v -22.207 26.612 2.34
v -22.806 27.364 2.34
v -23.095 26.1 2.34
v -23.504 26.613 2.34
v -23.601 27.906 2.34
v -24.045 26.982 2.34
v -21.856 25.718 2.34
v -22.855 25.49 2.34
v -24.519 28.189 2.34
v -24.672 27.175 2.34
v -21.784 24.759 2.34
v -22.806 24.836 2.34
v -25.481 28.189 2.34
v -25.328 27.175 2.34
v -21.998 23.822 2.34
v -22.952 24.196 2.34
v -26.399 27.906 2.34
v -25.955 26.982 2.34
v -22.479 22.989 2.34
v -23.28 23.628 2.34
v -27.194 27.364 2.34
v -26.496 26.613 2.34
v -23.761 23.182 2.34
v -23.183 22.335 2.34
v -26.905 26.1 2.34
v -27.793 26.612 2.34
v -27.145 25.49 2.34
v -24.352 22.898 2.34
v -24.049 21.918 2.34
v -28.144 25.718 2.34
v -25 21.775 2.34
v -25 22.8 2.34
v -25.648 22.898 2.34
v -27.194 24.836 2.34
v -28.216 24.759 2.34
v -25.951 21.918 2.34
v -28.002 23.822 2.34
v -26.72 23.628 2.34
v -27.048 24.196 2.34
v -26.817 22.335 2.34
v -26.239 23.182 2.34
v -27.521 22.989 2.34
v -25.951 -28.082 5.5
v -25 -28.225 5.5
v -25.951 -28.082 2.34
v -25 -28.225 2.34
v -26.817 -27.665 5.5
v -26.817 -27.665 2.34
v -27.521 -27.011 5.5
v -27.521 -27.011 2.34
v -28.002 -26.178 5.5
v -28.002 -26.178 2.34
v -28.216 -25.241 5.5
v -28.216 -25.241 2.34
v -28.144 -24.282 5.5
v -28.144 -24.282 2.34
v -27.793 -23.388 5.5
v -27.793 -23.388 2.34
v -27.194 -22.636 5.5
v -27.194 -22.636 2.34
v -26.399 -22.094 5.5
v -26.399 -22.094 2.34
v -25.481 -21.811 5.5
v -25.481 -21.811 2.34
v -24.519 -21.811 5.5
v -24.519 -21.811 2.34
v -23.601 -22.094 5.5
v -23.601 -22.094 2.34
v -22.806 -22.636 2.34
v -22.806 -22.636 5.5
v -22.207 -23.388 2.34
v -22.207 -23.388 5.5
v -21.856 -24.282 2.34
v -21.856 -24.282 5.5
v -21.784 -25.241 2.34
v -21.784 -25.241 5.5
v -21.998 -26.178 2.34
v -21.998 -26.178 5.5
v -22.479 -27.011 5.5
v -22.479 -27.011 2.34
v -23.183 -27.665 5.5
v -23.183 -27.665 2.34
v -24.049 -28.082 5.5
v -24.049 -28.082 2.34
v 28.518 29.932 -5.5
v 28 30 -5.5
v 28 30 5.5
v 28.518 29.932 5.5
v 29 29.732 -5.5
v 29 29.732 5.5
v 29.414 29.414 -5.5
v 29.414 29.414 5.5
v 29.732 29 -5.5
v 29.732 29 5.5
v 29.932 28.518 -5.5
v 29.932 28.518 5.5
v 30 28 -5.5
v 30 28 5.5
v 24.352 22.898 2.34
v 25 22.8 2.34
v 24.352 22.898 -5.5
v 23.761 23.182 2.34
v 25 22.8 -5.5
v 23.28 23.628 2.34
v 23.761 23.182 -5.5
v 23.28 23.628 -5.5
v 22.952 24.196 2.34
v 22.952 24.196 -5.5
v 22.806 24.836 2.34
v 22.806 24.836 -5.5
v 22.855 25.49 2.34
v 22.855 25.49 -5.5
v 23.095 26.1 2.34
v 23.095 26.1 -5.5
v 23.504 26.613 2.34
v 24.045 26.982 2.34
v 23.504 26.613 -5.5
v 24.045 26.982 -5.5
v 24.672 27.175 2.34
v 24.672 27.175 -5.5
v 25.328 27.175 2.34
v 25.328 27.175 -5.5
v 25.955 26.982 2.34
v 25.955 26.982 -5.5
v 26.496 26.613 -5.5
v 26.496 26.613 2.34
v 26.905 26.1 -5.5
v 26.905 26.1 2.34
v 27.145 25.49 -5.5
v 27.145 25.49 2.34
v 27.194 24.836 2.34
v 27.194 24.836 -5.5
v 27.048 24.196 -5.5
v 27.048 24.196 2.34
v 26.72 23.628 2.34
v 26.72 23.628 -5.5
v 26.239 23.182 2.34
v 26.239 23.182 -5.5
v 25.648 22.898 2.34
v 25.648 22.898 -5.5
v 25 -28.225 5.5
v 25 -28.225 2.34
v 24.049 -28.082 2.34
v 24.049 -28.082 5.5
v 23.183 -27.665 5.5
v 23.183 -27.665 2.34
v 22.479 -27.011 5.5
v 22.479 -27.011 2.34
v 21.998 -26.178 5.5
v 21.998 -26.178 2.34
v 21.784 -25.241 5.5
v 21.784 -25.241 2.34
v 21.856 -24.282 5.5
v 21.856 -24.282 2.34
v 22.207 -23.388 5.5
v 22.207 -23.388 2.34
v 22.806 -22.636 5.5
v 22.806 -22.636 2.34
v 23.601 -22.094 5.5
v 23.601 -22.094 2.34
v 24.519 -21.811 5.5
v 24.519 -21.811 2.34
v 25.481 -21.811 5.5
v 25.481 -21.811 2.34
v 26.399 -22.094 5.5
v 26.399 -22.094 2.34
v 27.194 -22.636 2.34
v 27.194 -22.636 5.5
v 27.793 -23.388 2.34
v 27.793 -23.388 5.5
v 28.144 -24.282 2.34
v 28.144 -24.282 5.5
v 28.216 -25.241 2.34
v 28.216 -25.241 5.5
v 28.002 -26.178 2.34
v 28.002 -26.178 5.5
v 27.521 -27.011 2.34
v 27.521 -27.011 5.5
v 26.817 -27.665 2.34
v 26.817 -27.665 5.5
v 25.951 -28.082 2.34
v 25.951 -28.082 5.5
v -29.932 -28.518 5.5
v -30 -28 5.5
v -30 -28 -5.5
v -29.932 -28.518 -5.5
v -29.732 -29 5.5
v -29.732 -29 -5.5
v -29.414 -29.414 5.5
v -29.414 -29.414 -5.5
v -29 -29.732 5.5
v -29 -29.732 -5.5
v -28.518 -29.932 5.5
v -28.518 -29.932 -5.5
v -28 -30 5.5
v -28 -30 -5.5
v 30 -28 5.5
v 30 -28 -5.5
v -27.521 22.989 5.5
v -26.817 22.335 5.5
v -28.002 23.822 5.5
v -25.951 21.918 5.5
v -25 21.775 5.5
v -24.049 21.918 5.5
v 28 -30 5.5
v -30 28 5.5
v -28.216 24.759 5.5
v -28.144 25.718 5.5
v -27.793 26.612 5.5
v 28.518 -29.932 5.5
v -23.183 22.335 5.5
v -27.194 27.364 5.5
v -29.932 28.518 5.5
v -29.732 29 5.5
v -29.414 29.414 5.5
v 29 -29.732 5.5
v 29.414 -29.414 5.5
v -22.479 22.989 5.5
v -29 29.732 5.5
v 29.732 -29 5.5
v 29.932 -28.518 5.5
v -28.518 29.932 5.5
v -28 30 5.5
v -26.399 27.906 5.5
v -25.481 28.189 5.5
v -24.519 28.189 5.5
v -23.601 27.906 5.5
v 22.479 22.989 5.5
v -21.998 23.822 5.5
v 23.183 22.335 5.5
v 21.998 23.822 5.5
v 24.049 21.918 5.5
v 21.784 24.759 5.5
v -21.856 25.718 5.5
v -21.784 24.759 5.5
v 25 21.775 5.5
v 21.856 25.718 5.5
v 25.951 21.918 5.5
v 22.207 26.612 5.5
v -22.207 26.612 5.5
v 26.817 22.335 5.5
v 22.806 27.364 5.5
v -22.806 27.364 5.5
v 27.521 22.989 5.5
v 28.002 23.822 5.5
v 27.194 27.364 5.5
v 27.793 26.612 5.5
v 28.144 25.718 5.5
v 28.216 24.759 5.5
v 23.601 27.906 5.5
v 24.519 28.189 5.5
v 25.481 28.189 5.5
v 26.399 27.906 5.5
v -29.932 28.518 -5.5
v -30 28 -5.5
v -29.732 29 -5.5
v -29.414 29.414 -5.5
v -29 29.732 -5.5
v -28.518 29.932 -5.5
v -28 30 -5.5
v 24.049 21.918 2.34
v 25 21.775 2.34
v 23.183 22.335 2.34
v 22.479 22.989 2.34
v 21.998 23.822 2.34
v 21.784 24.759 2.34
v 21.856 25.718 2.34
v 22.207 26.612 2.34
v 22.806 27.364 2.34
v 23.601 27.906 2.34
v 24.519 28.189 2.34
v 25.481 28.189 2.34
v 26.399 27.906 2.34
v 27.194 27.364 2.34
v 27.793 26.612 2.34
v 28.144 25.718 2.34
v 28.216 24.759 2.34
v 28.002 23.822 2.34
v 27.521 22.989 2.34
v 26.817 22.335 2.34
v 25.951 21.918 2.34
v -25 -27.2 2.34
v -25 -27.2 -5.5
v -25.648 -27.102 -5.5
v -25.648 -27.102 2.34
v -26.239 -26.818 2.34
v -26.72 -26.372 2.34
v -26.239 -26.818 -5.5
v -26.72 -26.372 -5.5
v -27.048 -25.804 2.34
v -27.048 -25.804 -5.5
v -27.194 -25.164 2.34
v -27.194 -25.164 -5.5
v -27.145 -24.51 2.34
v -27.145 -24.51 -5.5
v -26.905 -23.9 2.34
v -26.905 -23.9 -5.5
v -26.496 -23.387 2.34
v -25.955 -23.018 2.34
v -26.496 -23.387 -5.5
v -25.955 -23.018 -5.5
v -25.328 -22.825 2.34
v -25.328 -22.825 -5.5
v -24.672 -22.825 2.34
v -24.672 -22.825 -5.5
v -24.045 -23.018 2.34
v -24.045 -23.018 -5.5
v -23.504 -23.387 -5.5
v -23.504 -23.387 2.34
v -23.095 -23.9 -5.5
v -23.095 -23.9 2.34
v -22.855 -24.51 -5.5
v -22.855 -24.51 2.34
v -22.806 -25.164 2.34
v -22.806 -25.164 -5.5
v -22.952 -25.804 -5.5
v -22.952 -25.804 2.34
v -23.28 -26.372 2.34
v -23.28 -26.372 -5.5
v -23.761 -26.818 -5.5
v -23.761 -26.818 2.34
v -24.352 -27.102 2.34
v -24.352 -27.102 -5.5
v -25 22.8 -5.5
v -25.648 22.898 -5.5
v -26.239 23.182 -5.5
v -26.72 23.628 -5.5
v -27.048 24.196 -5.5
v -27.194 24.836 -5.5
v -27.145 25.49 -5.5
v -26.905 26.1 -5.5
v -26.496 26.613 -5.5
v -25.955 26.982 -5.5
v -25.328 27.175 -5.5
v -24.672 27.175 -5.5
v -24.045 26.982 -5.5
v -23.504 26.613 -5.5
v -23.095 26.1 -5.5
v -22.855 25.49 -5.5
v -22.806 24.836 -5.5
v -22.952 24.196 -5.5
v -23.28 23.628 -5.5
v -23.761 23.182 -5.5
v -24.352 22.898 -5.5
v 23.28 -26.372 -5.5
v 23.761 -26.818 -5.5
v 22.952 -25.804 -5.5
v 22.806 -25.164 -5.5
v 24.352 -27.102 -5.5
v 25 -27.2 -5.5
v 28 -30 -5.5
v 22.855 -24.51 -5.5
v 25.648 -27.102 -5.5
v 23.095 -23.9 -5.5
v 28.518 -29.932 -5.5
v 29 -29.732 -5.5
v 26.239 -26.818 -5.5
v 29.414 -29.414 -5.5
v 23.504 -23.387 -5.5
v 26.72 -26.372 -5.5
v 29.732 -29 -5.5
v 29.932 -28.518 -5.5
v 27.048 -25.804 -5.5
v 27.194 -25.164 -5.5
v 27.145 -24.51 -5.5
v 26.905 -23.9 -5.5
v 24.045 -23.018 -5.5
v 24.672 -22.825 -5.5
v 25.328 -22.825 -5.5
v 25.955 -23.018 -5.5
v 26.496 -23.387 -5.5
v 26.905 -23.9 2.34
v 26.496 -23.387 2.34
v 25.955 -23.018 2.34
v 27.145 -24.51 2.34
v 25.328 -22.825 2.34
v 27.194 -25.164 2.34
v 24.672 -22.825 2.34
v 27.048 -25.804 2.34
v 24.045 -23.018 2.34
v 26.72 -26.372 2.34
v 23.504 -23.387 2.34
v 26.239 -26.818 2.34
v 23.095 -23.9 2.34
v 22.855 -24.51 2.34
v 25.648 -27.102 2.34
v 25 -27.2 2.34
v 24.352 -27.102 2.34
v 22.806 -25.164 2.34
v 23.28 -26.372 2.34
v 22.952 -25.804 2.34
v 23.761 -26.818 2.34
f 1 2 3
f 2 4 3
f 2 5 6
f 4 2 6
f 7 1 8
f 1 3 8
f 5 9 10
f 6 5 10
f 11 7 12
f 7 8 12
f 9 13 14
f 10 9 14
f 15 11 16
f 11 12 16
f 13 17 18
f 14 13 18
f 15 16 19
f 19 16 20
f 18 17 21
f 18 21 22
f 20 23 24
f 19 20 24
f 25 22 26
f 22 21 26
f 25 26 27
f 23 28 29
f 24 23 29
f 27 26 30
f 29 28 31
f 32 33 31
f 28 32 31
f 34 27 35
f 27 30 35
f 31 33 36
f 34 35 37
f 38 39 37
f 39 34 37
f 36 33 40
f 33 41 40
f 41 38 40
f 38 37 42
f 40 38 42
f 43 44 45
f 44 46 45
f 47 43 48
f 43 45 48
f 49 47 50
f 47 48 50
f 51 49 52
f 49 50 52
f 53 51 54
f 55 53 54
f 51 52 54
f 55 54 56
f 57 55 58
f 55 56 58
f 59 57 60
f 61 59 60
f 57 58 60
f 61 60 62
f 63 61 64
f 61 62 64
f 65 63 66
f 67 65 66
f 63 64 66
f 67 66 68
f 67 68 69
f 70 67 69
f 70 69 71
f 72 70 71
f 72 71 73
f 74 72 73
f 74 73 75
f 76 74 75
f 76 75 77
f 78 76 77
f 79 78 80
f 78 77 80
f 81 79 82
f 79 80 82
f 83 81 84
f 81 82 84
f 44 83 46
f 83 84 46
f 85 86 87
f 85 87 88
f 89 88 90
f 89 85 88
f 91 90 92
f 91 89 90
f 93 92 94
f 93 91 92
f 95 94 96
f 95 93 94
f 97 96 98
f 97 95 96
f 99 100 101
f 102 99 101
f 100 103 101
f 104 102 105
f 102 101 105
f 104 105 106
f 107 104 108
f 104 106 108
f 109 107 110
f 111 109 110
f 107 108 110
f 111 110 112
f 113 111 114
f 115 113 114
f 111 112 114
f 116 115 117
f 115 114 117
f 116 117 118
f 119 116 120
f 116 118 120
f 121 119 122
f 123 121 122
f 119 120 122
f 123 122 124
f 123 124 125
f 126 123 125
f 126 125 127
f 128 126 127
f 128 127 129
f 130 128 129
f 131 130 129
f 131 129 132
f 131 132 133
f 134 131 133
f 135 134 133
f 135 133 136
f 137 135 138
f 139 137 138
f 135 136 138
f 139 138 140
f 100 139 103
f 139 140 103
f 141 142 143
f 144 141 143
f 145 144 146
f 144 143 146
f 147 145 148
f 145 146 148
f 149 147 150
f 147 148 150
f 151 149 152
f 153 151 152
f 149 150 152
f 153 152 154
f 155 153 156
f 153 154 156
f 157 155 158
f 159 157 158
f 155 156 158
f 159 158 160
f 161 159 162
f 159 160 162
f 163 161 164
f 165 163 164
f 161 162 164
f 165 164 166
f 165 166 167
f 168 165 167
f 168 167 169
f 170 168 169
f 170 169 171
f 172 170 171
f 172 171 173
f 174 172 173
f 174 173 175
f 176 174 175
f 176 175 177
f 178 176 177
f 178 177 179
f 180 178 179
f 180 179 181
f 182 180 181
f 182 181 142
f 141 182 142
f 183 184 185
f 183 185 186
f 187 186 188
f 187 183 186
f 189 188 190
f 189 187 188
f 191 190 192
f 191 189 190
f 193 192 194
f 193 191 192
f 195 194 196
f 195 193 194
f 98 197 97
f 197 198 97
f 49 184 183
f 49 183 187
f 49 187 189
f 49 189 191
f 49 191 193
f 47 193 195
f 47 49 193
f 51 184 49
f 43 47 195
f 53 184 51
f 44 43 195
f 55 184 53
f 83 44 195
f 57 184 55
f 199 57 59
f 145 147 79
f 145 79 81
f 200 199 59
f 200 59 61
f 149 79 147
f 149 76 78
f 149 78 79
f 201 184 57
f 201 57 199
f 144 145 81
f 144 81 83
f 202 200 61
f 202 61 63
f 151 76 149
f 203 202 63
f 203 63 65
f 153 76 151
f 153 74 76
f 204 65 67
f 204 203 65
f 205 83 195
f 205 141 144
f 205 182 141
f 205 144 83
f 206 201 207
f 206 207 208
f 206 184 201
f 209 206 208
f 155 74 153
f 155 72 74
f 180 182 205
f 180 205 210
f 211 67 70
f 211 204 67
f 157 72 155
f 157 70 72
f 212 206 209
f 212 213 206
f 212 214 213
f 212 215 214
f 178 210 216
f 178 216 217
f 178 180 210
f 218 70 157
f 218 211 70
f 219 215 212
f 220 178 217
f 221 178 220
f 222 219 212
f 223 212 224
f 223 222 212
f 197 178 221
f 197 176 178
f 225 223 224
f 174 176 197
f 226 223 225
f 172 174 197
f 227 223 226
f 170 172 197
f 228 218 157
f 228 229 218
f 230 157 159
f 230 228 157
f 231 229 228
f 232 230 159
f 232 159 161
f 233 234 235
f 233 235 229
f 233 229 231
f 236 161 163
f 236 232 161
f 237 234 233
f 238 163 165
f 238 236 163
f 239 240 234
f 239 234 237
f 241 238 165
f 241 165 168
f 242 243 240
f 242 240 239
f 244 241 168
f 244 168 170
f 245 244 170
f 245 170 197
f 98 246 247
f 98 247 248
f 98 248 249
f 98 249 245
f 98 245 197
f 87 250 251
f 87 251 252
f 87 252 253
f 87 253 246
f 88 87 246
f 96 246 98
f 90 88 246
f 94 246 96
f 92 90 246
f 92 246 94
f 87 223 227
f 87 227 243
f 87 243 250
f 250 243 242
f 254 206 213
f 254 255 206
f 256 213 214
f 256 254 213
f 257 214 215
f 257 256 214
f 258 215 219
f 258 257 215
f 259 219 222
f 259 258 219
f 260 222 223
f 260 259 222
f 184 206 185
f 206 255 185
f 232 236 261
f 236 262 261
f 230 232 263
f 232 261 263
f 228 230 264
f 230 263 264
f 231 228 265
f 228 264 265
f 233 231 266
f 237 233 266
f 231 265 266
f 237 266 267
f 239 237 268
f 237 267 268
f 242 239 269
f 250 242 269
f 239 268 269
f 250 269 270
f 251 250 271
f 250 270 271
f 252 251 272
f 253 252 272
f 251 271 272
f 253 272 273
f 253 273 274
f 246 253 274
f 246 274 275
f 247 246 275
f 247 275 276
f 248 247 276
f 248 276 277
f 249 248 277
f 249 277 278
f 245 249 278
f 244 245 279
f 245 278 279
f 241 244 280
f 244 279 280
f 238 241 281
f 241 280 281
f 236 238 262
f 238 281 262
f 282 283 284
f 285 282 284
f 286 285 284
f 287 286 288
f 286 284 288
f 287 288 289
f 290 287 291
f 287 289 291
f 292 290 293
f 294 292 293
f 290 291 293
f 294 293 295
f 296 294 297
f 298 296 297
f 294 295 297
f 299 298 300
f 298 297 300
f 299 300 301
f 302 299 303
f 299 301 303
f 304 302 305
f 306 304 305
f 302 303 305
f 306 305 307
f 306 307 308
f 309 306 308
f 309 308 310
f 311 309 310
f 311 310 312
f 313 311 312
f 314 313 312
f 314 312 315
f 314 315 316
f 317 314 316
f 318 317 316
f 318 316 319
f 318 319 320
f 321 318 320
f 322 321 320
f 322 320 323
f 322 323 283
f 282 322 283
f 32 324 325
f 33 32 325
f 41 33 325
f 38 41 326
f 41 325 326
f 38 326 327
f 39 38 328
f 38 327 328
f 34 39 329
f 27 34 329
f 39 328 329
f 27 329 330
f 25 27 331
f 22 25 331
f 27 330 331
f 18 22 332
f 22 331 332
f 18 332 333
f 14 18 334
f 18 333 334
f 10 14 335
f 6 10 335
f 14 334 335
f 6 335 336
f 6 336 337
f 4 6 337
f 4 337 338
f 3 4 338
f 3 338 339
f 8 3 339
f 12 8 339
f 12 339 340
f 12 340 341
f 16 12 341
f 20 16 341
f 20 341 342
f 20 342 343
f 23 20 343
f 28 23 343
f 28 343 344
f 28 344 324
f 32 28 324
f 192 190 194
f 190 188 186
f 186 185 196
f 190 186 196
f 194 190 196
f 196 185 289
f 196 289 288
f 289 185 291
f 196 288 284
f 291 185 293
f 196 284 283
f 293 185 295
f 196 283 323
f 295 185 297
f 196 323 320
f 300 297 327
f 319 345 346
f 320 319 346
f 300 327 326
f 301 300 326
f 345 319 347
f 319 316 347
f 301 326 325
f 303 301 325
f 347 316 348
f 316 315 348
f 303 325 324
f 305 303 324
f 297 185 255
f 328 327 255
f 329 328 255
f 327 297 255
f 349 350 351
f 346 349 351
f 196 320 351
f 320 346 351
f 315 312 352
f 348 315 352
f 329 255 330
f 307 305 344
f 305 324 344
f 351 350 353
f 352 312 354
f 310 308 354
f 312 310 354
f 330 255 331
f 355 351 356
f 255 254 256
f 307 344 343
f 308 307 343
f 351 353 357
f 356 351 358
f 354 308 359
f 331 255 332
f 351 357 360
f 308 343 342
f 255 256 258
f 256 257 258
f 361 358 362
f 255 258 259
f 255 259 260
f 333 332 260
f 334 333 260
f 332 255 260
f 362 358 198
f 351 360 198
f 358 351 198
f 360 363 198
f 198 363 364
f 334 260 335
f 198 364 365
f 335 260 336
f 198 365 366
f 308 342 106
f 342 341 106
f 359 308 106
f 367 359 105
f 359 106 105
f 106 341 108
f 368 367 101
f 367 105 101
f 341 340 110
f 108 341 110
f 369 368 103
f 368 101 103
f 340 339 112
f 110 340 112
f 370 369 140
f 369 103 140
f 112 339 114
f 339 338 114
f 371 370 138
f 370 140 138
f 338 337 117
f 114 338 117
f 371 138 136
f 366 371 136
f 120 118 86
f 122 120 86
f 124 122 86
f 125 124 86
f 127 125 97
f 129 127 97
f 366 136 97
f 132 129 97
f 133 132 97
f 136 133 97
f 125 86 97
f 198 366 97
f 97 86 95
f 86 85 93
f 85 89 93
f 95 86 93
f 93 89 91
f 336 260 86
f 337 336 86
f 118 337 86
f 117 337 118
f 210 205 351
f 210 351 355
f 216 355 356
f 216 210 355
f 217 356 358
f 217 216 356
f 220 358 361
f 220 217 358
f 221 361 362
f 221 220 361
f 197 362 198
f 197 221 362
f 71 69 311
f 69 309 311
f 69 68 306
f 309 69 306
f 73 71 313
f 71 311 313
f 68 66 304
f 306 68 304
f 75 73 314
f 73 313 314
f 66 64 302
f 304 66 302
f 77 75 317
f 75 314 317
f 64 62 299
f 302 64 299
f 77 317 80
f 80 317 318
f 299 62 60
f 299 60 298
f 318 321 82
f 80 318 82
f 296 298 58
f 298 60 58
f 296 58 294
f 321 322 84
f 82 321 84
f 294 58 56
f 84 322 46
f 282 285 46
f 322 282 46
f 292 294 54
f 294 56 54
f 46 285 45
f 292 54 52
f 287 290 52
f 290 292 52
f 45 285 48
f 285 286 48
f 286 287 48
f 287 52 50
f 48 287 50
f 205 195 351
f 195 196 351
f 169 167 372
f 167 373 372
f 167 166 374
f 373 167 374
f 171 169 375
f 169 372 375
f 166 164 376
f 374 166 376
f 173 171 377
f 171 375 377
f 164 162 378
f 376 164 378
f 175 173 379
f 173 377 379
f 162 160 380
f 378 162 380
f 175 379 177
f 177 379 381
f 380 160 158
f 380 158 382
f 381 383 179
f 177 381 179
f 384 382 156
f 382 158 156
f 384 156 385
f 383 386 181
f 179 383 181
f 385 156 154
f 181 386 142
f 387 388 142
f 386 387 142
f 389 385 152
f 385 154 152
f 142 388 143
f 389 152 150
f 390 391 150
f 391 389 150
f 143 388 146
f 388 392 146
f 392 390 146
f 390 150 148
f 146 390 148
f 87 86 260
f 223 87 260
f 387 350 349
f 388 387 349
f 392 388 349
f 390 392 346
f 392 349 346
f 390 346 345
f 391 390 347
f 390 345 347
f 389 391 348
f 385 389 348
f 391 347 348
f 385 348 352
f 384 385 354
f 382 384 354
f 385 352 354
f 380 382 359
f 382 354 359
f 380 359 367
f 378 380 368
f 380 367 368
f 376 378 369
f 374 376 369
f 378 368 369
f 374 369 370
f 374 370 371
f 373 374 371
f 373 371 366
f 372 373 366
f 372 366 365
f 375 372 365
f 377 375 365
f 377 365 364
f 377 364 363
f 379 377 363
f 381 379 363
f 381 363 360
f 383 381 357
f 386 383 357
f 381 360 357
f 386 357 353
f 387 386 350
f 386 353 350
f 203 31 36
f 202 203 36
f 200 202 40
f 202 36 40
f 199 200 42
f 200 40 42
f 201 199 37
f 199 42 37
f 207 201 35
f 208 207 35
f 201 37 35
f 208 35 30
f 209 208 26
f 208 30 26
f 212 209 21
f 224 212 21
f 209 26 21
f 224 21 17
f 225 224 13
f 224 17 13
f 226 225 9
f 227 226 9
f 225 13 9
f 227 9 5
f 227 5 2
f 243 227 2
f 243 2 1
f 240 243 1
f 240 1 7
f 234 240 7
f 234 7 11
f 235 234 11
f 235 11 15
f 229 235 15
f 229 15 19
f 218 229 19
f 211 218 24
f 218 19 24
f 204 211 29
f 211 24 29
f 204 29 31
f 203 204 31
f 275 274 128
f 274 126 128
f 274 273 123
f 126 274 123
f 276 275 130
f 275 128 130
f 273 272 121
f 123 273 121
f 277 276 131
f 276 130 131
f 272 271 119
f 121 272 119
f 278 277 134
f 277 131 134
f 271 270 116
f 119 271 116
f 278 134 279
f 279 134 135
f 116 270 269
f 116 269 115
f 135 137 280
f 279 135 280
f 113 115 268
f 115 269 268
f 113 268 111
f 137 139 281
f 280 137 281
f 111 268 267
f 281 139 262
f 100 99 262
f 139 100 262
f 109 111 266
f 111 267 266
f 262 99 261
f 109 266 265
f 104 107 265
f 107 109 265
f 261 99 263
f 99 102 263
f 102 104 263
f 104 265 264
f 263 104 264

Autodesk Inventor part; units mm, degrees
ref_plane "YZ Plane" through (0, 0, 0) normal (1, 0, 0) x (0, 1, 0)
ref_plane "XZ Plane" through (0, 0, 0) normal (0, 1, 0) x (-1, 0, 0)
ref_plane "XY Plane" through (0, 0, 0) normal (0, 0, 1) x (1, 0, 0)
sketch "Esquisse1" plane through (0, 0, 0) normal (0, 0, 1) x (1, 0, 0)
  line L0 (-30, -30) -> (30, -30)
  line L1 (30, -30) -> (30, 30)
  line L2 (30, 30) -> (-30, 30)
  line L3 (-30, 30) -> (-30, -30)
  line L4 (-30, -30) -> (30, 30) construction
  line L5 (30, -30) -> (-30, 30) construction
  point P0 (0, 0)
  dimension "d0" = 60
  dimension "d1" = 60
extrude "Extrusion1" add sketch "Esquisse1" along normal mid plane 11
sketch "Esquisse2" plane through (0, 0, 5.5) normal (0, 0, 1) x (1, 0, 0)
  point P0 (0, 0)
  point P1 (-25, 25)
  point P2 (25, 25)
  point P3 (25, -25)
  point P4 (-25, -25)
  dimension "d4" = 50
  dimension "d5" = 50
  dimension "d7" = 25
  dimension "d8" = 25
hole "Perçage1" at (-25, 25, 5.5) at (25, 25, 5.5) at (25, -25, 5.5) at (-25, -25, 5.5) direction (0, 0, -1) diameter 4.4 end through all counterbore diameter 6.45 counterbore depth 3.16
fillet "Congé1" radius 2 4 edges at (-30, 30, 0) (30, 30, 0) (30, -30, 0) (-30, -30, 0)
sketch "Esquisse3" plane through (-28, -30, -5.5) normal (0, -1, 0) x (1, 0, 0)
  line L0 (56, 0) -> (0, 0) projected
  point P0 (28, 5.5)
  point P1 (5, 3)
  point P2 (8, 3)
  dimension "d17" = 3
  dimension "d18" = 3
  dimension "d19" = 5
equation "\"d7\" = 0.5 * d5"
equation "\"d8\" = 0.5 * d5"
equation "\"pi\" = 3.141593"
equation "\"nombredor\" = 1.61803"
properties part number "Ventillateur_60x60x11" material "Plastique ABS"
